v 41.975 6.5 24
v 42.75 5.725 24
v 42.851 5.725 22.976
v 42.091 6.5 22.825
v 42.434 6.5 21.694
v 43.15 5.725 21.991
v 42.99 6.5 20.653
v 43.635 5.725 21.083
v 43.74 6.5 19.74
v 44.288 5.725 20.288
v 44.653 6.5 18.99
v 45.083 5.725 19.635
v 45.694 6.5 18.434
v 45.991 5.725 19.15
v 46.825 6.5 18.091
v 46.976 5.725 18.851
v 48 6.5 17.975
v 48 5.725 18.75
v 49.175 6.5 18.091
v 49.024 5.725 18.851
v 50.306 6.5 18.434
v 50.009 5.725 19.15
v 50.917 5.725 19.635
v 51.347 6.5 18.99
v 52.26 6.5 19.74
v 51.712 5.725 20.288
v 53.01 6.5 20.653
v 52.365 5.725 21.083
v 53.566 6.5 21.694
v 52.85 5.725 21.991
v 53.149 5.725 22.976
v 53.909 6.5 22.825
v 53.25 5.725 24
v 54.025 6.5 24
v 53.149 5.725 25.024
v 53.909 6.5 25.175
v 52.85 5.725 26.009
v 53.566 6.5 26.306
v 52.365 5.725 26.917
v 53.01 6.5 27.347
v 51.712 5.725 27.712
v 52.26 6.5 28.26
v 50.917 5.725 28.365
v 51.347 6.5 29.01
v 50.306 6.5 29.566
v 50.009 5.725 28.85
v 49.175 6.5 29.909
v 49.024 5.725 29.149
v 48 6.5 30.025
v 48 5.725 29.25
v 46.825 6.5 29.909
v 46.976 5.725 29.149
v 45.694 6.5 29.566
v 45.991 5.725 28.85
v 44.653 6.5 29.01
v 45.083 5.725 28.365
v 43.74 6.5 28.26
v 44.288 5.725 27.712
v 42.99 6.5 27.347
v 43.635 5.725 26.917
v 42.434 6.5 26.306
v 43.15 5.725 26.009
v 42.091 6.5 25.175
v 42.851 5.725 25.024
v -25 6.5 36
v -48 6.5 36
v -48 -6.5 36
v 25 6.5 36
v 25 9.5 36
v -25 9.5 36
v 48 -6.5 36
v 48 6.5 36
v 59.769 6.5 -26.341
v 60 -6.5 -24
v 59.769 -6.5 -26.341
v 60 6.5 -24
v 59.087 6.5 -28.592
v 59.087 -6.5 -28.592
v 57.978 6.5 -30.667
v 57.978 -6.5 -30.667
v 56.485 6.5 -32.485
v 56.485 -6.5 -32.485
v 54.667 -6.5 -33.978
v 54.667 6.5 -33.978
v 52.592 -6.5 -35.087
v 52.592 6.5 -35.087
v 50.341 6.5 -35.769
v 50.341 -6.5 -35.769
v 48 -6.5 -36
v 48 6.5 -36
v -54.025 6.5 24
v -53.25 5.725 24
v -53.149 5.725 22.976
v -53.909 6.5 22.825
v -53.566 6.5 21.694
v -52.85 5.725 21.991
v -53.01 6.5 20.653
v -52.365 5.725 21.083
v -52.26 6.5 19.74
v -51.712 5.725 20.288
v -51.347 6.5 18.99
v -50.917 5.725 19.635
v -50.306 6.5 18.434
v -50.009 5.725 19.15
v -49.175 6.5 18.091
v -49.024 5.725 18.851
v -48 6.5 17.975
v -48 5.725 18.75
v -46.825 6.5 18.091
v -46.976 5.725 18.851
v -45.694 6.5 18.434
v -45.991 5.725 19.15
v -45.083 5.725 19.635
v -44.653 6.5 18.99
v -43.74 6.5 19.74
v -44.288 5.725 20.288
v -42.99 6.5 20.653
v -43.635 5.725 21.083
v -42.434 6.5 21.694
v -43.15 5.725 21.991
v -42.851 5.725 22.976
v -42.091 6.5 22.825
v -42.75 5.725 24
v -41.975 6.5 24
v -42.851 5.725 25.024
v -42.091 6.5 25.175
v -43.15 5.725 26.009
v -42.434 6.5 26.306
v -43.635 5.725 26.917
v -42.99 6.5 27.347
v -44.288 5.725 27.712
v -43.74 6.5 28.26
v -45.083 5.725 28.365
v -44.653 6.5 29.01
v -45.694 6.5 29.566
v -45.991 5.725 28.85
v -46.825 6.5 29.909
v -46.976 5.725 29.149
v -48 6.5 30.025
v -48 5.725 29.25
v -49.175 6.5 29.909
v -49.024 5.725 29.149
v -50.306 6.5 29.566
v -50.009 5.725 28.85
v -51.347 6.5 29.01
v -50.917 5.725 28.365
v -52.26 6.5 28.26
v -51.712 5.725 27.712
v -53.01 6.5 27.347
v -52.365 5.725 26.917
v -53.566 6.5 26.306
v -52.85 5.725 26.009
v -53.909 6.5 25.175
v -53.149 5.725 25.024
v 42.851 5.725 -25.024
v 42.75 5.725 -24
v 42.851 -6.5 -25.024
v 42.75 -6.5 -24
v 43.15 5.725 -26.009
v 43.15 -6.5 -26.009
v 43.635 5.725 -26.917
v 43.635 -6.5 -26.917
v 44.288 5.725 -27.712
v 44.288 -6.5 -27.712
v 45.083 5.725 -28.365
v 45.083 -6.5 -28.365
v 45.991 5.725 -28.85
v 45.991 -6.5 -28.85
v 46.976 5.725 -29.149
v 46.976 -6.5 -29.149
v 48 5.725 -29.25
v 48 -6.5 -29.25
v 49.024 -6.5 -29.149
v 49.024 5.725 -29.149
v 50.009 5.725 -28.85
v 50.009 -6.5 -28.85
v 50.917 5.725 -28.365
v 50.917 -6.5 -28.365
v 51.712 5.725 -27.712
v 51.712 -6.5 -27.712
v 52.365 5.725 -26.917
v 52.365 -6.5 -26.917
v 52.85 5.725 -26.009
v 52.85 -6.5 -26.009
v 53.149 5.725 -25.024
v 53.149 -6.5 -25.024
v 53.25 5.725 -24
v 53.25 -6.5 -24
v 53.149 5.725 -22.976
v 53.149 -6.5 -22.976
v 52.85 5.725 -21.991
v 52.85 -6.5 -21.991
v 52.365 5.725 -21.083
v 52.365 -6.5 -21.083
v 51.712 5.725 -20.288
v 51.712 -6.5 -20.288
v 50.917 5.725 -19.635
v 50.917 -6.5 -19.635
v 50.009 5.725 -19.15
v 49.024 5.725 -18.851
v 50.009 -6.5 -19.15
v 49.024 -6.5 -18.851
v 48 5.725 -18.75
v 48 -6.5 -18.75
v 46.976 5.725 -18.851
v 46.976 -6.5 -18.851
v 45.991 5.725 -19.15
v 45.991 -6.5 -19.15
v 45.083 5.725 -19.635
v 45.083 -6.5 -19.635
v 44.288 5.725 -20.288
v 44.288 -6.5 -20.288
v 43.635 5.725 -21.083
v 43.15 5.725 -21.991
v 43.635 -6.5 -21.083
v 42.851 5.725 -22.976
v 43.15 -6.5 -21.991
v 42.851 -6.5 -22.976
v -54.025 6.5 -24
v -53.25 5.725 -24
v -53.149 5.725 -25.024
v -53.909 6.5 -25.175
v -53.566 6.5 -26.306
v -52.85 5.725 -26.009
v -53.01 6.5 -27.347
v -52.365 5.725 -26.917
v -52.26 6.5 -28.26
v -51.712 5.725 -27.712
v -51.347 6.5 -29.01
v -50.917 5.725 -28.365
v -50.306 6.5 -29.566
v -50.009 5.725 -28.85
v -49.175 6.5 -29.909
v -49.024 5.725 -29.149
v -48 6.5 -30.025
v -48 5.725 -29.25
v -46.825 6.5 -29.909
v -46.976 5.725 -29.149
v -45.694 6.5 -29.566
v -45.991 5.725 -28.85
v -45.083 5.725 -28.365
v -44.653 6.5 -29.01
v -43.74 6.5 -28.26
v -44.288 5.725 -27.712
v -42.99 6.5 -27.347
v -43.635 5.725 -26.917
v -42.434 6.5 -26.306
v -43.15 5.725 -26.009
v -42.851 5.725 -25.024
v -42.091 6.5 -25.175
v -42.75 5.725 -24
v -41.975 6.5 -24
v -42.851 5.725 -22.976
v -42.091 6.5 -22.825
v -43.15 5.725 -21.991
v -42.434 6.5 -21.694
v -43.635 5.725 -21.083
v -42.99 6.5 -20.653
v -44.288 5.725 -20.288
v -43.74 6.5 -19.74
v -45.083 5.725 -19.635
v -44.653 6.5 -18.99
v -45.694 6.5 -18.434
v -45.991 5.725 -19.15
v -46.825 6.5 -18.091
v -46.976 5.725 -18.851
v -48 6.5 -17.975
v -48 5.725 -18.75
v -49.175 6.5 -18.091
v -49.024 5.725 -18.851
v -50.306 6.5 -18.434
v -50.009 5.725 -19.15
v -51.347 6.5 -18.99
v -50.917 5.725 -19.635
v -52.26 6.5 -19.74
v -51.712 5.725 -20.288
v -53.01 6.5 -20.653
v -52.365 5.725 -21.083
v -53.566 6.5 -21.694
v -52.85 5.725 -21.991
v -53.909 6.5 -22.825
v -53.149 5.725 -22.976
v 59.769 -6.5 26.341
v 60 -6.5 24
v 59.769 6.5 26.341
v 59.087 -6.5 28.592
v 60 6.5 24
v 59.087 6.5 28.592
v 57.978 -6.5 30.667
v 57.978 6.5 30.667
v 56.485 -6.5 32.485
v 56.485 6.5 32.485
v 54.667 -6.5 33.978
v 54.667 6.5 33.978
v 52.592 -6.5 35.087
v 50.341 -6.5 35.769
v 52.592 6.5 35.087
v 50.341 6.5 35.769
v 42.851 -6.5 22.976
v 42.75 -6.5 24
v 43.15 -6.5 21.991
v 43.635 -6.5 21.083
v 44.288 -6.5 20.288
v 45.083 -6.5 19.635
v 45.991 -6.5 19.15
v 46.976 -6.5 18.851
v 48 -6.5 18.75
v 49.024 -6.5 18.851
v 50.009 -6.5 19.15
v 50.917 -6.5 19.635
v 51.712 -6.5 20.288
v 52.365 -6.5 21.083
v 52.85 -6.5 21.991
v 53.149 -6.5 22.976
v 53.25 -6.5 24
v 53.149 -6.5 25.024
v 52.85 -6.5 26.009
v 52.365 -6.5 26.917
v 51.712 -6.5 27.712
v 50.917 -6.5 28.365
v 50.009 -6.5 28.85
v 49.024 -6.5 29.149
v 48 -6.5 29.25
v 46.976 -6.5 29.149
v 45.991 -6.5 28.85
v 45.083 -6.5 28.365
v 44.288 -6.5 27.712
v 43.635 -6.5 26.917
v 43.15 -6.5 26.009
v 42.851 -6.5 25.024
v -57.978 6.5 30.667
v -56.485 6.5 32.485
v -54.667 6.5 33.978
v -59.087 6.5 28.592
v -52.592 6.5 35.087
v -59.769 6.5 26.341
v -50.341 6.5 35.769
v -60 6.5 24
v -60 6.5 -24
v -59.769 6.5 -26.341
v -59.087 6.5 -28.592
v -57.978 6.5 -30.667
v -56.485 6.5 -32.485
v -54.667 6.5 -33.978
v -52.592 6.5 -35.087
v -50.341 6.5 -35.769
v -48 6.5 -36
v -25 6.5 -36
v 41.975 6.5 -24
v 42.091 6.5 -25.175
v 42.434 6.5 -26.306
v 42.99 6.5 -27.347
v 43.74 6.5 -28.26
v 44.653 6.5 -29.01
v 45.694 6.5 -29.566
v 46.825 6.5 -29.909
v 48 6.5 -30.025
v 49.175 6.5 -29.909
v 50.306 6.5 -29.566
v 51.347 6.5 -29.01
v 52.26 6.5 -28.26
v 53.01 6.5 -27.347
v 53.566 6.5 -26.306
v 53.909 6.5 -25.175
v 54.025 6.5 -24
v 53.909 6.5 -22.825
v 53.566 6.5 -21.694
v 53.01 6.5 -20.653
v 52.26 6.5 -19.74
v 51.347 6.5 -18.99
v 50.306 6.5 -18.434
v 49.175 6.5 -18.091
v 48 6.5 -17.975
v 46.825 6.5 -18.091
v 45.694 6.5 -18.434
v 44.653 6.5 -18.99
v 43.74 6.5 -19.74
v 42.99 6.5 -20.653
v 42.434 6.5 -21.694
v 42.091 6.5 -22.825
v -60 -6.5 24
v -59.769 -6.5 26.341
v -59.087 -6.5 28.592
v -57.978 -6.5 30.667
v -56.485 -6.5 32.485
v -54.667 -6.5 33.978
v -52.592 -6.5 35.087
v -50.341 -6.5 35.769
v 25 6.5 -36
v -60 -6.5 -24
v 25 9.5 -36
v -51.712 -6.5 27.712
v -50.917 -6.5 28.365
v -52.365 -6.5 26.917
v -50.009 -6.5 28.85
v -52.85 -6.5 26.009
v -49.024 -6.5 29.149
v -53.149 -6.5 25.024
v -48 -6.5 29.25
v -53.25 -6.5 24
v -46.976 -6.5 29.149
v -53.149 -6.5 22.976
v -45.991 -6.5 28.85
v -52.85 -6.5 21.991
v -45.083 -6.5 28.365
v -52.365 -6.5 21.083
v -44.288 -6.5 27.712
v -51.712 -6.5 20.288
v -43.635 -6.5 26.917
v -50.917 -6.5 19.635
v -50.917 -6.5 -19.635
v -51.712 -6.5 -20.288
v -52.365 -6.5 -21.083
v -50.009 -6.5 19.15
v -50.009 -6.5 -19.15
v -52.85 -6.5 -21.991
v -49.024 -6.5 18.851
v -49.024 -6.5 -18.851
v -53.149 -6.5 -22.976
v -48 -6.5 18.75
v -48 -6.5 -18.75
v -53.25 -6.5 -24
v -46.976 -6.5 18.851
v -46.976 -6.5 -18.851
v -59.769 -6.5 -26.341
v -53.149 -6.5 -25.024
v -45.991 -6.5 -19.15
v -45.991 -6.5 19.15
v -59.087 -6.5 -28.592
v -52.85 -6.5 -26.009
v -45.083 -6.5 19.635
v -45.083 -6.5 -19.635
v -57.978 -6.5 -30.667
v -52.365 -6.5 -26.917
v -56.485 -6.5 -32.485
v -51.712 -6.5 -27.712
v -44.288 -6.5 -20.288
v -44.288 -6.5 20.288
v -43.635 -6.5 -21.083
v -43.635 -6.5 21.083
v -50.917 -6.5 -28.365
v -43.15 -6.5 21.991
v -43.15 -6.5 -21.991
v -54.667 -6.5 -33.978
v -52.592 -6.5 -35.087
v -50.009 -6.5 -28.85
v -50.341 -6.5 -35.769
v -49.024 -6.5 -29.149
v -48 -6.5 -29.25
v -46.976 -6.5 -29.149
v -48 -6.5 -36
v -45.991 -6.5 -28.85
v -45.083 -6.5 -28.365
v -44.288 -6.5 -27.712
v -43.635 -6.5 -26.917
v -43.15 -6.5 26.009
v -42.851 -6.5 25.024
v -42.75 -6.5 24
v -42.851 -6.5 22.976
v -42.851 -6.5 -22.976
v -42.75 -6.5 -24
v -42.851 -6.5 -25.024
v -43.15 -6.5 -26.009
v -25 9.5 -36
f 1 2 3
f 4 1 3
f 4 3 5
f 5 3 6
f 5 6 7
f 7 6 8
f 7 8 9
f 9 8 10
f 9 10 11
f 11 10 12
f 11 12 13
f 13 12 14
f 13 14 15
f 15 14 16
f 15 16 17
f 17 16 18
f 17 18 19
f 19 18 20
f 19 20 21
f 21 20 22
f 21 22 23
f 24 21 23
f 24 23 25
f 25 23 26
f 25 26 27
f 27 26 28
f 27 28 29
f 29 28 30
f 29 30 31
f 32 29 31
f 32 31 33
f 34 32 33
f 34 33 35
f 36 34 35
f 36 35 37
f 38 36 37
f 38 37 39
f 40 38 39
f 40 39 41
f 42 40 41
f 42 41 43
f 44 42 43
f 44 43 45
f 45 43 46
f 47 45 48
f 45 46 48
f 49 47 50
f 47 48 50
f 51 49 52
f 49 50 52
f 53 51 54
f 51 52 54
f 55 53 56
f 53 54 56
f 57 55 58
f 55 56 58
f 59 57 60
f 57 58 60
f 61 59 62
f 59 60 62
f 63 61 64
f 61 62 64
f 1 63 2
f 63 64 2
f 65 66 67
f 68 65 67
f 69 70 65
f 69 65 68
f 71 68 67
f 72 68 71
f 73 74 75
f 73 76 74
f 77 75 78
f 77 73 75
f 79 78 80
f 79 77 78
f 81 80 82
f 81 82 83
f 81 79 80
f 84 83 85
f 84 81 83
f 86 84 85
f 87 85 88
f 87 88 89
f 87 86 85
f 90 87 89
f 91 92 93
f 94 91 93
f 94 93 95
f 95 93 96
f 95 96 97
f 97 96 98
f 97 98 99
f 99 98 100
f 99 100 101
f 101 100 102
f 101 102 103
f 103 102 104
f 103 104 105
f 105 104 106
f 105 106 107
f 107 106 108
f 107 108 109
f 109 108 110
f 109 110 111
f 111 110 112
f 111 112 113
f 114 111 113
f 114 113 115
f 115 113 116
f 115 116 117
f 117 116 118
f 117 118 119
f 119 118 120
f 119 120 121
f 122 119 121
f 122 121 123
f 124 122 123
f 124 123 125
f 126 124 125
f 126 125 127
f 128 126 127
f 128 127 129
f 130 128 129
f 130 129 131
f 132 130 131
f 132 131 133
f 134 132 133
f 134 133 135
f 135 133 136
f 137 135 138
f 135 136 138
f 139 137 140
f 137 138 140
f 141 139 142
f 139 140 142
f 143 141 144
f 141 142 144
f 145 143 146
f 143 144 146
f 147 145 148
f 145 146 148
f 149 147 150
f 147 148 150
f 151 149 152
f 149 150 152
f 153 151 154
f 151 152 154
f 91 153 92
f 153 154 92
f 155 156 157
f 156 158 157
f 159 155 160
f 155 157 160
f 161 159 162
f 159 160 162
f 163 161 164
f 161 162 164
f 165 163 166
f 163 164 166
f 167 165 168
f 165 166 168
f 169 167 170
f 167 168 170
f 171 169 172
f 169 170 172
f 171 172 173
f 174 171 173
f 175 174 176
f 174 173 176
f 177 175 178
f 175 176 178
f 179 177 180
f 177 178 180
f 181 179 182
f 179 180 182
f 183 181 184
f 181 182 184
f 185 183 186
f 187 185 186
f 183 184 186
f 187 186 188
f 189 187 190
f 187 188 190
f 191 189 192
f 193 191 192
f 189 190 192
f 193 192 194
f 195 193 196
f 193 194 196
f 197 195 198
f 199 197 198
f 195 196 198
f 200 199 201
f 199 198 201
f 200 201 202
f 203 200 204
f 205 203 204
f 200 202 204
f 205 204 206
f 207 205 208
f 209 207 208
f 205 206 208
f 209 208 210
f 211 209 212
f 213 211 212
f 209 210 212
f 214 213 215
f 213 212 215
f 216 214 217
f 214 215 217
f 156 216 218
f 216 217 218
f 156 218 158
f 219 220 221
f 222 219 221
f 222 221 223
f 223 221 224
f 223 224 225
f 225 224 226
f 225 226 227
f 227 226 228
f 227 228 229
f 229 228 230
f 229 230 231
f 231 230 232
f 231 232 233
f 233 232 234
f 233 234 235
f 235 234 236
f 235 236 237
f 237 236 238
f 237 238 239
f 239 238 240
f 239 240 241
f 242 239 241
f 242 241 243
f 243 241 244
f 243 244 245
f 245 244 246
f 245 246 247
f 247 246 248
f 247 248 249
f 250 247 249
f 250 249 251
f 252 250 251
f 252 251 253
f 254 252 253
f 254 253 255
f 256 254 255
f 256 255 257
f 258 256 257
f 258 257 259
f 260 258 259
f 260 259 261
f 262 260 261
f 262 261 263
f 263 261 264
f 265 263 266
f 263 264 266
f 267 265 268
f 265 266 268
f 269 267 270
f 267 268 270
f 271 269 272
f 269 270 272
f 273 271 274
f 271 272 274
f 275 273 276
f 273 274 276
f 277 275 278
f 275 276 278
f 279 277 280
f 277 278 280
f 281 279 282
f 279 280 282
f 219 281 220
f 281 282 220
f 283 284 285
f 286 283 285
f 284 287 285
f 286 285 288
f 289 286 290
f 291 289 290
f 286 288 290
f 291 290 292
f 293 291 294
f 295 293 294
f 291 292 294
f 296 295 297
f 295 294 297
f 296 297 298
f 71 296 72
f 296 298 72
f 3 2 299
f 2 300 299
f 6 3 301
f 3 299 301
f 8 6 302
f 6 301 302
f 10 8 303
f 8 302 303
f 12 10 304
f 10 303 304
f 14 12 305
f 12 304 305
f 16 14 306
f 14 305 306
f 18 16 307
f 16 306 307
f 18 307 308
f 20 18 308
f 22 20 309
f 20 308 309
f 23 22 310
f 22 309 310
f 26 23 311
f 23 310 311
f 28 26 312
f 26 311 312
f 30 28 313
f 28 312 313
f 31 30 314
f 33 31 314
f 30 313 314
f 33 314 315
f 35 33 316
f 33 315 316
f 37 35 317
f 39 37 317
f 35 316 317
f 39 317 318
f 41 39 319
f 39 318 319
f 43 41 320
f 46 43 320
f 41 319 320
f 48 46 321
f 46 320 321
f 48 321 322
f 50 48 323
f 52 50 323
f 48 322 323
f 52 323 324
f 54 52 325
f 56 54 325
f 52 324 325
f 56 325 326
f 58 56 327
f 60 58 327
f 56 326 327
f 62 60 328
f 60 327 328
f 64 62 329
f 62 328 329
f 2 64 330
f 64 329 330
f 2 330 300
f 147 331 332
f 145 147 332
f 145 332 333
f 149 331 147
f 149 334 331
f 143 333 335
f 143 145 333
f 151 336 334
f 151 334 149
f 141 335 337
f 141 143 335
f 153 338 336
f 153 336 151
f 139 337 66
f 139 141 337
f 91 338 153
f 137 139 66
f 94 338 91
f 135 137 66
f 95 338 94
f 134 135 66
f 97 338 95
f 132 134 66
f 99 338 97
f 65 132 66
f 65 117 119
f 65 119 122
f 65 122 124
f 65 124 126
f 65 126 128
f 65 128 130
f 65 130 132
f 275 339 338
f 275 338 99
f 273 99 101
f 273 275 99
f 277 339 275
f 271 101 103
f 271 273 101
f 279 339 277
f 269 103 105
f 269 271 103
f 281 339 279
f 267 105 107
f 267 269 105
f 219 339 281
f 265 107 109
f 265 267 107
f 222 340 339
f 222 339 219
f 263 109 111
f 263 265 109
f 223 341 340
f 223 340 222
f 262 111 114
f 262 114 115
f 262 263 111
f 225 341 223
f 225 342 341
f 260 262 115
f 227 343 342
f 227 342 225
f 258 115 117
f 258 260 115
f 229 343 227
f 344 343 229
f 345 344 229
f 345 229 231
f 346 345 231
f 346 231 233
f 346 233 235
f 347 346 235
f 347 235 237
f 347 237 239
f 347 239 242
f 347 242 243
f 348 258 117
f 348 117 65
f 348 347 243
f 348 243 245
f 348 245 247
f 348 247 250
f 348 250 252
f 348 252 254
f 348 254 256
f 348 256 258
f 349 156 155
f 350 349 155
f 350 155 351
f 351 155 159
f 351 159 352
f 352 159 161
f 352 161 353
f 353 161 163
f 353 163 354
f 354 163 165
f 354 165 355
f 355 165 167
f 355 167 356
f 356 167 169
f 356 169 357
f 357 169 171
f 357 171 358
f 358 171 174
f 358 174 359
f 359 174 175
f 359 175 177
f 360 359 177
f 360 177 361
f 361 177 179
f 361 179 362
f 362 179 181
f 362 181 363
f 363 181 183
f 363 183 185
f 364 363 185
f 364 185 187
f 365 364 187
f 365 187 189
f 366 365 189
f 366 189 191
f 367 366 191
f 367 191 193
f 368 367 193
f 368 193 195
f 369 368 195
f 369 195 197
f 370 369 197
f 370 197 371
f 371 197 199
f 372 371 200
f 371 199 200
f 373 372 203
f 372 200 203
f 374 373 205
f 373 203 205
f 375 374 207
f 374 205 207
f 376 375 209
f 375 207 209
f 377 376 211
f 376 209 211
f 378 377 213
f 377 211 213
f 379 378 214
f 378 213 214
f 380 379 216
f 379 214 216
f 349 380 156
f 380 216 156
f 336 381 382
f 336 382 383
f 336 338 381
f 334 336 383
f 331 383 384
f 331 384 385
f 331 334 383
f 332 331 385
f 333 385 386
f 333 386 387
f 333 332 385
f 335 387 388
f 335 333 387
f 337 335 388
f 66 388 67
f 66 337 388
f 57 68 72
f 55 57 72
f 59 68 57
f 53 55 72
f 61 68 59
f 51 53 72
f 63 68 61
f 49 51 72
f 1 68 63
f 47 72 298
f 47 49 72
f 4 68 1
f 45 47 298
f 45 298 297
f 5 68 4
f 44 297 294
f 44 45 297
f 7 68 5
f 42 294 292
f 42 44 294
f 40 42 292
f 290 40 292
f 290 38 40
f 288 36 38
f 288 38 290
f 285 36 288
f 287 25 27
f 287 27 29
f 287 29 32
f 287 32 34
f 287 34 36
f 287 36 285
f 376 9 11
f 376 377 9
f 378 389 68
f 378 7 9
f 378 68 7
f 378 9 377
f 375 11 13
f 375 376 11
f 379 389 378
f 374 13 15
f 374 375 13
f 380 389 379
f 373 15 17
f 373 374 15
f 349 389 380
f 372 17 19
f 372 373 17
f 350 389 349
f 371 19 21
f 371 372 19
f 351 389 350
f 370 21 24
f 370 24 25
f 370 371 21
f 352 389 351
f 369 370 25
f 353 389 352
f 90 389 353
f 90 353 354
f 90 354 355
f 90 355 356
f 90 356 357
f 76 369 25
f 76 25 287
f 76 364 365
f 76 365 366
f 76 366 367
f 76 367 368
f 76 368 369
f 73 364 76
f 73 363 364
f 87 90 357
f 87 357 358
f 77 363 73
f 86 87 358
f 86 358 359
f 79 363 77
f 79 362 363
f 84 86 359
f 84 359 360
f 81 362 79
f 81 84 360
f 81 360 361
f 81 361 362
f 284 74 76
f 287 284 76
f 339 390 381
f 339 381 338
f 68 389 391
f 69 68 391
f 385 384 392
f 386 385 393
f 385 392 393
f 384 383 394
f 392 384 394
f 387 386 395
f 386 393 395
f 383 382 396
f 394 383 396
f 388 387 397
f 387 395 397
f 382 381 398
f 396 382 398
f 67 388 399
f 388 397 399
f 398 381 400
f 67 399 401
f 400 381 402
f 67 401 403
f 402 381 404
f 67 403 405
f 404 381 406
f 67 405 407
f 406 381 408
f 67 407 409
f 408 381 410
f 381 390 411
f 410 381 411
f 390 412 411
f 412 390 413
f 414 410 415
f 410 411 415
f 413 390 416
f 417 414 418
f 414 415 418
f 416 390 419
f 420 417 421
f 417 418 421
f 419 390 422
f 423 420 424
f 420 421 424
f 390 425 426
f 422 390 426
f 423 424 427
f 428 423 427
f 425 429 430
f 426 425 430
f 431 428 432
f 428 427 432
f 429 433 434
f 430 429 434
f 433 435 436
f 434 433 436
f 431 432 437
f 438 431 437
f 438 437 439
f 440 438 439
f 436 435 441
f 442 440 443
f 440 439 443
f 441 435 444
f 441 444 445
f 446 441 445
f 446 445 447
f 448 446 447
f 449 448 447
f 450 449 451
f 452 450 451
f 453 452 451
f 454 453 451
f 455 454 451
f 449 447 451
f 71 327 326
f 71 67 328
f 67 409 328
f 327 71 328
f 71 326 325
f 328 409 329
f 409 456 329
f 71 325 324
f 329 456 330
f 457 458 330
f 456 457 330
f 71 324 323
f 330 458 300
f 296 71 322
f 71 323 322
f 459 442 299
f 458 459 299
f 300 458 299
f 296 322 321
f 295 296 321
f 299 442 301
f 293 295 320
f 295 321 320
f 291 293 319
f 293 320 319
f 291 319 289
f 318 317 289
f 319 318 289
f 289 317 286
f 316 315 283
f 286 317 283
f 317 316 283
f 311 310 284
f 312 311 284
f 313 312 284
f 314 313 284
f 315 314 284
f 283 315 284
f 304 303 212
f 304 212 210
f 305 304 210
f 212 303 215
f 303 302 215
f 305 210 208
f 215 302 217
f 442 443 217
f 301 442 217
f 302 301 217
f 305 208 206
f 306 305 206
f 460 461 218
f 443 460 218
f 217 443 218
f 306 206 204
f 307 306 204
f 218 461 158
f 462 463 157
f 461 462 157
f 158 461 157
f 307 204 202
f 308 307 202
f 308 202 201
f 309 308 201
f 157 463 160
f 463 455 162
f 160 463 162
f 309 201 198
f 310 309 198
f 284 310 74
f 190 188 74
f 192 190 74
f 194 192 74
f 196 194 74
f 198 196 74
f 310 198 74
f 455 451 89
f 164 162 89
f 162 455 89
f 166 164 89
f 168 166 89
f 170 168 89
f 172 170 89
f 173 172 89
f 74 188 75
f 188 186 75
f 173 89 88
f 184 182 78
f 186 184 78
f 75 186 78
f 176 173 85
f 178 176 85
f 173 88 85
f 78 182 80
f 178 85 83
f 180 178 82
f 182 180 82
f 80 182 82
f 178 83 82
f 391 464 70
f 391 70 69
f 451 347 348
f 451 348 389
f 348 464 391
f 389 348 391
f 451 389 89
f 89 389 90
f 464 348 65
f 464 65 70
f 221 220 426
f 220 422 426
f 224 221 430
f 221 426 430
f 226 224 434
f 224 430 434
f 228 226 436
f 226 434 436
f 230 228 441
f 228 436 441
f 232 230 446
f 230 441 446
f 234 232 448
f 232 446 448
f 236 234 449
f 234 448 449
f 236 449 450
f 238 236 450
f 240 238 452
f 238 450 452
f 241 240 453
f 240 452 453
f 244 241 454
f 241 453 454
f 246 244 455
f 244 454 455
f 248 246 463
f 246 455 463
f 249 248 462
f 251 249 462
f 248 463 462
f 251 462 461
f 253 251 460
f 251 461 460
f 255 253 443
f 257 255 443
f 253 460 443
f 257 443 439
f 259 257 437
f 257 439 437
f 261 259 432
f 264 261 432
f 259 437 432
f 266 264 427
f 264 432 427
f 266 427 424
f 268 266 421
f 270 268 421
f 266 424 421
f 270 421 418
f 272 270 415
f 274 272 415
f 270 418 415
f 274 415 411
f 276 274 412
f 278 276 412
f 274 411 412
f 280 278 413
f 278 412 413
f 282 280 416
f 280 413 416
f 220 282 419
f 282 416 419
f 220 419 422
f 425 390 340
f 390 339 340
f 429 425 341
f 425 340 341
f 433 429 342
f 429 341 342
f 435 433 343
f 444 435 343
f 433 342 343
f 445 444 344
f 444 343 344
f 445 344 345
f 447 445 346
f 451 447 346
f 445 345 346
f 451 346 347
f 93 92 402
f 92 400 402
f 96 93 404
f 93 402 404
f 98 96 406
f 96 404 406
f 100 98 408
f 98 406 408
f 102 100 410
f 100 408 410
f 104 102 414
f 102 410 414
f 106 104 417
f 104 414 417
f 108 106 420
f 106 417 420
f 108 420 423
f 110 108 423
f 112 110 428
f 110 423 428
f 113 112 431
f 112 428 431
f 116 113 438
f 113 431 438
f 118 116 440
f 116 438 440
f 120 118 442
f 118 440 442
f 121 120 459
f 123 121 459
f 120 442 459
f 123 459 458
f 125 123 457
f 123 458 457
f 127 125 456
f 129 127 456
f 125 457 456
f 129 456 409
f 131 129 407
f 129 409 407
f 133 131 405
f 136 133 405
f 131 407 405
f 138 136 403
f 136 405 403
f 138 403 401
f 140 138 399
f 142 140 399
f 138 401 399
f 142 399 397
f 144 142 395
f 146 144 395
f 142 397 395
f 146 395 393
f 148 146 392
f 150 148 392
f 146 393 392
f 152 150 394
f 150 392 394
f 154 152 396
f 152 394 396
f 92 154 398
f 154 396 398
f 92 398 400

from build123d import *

# Parameters (mm, degrees)
BOSS_EXTRUDE1_DEPTH              = 36
BOSS_EXTRUDE1_DEPTH_BACK         = 36
FILLET1_R                        = 12
M12X1_5_TAPPED_HOLE1_D           = 10.5
M12X1_5_TAPPED_HOLE1_CSINK_D     = 12.05
M12X1_5_TAPPED_HOLE1_CSINK_ANGLE = 90


with BuildPart() as part:
    # Sketch1 → Boss-Extrude1 (new, two sides: drawn at the far end of the back side and taken through both)
    with BuildSketch(Plane.XY.offset(-BOSS_EXTRUDE1_DEPTH_BACK)):
        Polygon((-60, 6.5), (-60, -6.5), (60, -6.5), (60, 6.5), (25, 6.5), (25, 9.5), (-25, 9.5), (-25, 6.5), align=None)
    extrude(amount=BOSS_EXTRUDE1_DEPTH + BOSS_EXTRUDE1_DEPTH_BACK)

    # Fillet1
    fillet1_edges = [part.edges().sort_by_distance(p)[0] for p in [
        (-60, 0, -36),
        (-60, 0, 36),
        (60, 0, -36),
        (60, 0, 36),
    ]]
    fillet(fillet1_edges, radius=FILLET1_R)

    # M12x1.5 Tapped Hole1 (through all)
    with Locations(Plane(origin=(0, 6.5, 0), x_dir=(1, 0, 0), z_dir=(0, 1, 0))):
        with Locations((-48, -24), (-48, 24), (48, 24), (48, -24)):
            CounterSinkHole(M12X1_5_TAPPED_HOLE1_D / 2, M12X1_5_TAPPED_HOLE1_CSINK_D / 2, counter_sink_angle=M12X1_5_TAPPED_HOLE1_CSINK_ANGLE)


solid = part.part
